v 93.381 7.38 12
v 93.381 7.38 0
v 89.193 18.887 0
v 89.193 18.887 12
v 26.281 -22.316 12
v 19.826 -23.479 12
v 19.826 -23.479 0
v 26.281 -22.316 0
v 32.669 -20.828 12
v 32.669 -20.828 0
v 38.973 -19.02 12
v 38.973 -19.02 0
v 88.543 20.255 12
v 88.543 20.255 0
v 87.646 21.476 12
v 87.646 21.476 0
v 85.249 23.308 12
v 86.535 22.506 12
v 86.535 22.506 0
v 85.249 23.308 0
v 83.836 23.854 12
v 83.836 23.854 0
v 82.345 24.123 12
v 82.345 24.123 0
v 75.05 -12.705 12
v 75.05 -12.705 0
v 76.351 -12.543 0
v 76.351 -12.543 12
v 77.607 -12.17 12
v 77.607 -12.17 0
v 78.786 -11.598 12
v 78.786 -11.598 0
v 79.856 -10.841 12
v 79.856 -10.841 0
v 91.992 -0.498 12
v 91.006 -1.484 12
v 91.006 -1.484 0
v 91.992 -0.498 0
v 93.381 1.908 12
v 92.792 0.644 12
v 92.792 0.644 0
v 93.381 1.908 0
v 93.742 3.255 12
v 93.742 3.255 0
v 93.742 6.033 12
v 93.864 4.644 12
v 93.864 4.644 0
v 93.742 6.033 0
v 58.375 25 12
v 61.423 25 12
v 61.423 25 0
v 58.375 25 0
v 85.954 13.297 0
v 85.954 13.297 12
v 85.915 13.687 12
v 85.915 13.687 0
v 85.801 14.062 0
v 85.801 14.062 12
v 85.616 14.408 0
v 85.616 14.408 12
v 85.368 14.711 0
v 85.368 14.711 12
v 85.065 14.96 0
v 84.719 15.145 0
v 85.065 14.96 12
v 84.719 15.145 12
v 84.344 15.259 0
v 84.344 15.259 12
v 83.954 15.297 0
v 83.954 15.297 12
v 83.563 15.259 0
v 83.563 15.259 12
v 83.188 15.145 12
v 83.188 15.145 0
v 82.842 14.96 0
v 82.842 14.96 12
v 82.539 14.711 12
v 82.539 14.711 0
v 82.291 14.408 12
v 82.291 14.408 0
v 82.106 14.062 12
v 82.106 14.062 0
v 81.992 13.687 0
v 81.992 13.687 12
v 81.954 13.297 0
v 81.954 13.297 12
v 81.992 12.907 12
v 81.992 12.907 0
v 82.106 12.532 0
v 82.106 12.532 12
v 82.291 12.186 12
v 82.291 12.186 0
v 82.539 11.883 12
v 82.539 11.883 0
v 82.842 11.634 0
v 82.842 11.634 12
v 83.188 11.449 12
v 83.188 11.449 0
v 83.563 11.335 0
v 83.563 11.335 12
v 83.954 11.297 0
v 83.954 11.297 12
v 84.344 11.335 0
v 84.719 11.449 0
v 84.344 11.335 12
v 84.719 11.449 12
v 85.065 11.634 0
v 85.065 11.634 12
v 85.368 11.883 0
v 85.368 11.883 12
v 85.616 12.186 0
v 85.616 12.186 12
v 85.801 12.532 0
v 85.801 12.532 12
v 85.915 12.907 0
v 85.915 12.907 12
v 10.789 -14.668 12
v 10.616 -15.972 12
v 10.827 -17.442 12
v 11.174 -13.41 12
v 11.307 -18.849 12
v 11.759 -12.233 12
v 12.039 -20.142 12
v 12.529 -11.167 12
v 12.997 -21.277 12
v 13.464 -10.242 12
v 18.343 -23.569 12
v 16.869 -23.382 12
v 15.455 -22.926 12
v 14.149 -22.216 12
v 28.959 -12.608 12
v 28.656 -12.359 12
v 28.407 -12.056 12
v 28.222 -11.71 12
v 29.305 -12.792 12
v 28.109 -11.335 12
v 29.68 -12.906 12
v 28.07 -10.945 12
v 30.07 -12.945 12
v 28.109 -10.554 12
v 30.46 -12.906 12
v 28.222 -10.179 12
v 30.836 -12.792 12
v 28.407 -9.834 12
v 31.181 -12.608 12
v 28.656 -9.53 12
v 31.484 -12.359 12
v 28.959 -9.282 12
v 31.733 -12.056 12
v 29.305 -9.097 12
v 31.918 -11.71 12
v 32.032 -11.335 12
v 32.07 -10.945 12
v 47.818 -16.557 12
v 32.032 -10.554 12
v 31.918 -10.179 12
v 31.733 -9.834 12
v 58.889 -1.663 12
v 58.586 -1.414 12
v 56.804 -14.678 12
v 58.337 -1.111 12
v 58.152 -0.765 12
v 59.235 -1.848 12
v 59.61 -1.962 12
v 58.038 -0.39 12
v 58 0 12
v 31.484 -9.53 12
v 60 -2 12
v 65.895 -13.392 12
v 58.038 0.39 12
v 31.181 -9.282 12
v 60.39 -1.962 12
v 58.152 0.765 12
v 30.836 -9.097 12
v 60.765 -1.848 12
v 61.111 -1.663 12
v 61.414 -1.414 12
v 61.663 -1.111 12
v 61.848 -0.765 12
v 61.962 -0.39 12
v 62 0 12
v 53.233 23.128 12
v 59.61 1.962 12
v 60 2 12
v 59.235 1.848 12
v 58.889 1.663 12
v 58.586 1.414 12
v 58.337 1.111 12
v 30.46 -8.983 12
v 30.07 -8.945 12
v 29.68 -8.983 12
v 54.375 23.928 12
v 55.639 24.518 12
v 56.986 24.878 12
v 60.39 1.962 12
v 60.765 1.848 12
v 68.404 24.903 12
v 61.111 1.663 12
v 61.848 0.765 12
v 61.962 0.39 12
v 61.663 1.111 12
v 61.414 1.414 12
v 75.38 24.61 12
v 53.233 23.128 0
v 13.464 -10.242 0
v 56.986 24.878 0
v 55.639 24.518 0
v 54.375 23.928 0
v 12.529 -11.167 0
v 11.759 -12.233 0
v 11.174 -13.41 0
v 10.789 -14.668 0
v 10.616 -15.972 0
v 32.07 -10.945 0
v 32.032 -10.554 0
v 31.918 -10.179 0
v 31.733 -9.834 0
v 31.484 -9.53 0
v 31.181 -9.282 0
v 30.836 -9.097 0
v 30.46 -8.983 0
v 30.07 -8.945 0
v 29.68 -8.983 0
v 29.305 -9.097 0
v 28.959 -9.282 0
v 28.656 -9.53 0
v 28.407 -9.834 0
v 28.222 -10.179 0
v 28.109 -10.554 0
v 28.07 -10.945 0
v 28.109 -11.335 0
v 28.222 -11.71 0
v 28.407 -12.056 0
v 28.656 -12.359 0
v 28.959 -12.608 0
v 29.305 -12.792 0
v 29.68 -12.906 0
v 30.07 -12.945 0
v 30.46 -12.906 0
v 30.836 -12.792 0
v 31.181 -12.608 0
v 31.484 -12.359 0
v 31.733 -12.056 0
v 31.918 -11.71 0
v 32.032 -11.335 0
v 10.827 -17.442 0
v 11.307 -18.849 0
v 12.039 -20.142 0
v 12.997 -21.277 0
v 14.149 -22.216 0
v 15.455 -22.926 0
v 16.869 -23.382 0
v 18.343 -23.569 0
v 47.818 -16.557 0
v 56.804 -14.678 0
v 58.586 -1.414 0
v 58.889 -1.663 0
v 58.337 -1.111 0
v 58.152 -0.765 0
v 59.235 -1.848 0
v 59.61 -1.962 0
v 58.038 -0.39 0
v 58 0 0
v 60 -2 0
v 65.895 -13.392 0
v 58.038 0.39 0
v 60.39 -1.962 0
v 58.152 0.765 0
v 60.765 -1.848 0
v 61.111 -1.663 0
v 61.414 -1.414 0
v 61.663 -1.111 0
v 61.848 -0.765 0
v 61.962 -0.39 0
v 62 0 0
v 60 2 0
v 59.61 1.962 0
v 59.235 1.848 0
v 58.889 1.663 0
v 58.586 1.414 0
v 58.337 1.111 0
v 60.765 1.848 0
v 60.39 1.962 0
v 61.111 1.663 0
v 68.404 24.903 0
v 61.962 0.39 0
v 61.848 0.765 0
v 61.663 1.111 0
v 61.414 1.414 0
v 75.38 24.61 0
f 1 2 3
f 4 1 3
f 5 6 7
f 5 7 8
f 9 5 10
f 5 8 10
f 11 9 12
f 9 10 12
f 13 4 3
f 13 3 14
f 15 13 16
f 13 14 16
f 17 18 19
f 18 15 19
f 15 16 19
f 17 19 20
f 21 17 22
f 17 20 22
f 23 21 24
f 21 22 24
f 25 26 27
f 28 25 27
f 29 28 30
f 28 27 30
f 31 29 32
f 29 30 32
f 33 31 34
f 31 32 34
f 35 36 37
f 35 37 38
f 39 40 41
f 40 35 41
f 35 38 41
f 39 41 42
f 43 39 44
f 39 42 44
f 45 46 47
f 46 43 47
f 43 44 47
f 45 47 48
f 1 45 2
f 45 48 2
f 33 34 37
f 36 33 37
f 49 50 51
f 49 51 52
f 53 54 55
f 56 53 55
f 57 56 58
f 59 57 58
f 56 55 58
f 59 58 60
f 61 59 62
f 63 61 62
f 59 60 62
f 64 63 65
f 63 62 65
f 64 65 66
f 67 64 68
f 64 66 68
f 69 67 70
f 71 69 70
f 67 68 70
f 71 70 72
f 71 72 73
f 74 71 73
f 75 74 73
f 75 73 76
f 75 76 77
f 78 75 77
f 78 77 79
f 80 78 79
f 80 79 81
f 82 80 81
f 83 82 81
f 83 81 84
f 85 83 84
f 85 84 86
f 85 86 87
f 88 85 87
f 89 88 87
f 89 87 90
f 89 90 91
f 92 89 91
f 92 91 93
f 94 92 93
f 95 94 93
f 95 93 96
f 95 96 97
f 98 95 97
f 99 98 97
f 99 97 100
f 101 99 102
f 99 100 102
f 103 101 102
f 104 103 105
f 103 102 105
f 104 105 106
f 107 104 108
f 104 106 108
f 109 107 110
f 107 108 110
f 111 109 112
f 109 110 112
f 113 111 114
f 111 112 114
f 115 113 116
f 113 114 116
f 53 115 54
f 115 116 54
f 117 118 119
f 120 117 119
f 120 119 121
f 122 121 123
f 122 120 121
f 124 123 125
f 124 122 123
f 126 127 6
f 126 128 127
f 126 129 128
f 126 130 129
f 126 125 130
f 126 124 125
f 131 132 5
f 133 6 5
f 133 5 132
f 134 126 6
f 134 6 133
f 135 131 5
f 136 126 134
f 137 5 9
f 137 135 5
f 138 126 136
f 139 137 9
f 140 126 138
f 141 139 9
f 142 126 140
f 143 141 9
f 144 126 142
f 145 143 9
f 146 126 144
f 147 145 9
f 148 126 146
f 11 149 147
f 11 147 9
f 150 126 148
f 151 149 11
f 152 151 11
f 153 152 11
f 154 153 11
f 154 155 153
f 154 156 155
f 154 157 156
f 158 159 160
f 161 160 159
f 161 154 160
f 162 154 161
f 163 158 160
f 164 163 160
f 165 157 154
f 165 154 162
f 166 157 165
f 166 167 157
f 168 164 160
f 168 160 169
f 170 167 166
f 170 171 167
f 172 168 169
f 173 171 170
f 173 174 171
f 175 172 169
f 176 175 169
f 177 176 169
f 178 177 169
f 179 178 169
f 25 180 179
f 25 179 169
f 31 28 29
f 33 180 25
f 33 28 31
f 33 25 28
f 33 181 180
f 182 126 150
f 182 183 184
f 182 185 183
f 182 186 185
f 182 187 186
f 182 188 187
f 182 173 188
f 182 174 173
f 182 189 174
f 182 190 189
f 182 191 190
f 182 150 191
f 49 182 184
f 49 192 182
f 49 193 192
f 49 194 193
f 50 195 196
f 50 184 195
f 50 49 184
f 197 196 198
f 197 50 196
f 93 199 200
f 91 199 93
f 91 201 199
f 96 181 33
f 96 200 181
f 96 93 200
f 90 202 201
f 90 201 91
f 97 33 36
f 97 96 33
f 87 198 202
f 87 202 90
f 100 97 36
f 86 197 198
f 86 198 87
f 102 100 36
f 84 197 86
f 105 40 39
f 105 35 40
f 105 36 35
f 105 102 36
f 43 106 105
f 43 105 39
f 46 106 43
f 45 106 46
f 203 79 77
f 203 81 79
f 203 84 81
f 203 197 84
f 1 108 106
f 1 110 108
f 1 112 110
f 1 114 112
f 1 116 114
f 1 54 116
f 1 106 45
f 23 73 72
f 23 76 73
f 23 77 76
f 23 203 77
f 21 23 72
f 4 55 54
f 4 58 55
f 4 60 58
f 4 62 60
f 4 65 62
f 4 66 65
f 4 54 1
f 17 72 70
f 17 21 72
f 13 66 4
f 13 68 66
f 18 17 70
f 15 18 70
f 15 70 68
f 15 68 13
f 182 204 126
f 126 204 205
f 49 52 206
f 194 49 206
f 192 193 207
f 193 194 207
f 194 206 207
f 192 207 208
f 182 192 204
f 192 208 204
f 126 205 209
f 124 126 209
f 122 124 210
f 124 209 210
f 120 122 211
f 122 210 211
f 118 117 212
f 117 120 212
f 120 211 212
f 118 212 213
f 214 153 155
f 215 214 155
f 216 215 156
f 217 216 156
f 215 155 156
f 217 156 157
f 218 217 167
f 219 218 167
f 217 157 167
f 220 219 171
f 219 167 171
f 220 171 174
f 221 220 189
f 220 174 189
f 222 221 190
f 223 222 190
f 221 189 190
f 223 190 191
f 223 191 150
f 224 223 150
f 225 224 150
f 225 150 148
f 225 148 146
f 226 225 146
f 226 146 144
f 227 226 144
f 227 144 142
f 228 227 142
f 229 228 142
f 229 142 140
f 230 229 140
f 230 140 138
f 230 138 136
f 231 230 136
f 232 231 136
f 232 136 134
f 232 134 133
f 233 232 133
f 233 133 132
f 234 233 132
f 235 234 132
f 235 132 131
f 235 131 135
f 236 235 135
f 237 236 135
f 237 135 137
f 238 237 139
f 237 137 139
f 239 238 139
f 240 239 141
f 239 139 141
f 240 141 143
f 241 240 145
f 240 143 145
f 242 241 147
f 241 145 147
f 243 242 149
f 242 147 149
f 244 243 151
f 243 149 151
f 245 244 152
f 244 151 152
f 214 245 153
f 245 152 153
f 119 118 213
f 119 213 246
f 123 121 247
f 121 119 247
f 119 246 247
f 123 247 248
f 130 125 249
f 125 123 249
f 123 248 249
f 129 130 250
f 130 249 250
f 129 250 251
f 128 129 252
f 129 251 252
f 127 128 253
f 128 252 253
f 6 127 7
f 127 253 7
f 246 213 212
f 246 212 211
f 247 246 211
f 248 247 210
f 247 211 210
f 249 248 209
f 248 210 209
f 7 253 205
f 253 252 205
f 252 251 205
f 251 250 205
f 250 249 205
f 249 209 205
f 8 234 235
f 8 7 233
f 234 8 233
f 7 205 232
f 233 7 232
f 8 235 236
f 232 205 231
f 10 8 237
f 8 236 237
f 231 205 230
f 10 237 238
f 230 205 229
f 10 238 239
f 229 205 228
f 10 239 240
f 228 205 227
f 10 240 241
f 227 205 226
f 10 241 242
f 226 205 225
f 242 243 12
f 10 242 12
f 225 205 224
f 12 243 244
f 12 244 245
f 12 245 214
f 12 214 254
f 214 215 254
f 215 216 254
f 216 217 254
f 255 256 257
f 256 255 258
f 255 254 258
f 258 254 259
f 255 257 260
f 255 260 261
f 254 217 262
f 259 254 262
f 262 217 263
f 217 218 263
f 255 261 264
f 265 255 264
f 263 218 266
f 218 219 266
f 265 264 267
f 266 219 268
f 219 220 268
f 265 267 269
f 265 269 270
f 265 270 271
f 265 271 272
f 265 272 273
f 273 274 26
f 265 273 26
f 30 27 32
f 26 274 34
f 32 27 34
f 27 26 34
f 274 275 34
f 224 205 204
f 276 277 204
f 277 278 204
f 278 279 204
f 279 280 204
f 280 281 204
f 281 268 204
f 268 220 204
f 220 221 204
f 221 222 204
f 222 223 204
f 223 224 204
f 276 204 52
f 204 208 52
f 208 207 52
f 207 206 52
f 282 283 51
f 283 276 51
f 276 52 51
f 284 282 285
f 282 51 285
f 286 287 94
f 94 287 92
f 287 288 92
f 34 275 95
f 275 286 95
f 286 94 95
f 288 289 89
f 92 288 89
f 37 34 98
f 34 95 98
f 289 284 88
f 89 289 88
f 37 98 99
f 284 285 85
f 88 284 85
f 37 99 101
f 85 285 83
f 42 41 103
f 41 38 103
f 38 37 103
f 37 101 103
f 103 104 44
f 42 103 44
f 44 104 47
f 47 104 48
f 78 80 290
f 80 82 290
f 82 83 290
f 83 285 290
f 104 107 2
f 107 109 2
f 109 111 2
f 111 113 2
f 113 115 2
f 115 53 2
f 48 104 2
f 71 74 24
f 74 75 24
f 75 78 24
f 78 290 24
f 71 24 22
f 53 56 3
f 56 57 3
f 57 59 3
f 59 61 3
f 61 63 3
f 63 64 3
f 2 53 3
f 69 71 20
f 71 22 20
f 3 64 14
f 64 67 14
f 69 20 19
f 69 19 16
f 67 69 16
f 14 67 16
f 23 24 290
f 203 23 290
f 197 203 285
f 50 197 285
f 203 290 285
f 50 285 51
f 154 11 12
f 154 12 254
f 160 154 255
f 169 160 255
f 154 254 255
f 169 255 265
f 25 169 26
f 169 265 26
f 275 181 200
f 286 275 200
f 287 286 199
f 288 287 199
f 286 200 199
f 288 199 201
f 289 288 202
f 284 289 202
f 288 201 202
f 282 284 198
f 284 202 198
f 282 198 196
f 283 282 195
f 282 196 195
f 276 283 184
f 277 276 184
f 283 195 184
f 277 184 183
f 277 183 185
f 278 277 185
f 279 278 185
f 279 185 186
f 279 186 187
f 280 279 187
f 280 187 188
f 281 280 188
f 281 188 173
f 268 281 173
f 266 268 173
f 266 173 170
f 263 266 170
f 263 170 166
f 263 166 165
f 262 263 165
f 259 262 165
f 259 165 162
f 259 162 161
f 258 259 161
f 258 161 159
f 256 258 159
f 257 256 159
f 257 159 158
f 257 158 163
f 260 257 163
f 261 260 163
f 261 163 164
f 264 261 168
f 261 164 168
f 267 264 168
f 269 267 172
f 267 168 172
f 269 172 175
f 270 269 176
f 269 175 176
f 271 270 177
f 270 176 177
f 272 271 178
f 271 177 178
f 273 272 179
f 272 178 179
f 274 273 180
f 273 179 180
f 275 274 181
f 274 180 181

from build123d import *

# Parameters (mm, degrees)
BOSS_EXTRUDE1_DEPTH = 12
SKETCH4_R           = 2
CUT_EXTRUDE2_DEPTH  = 100.249994256
FILLET2_R           = 8


with BuildPart() as part:
    # Sketch1 → Boss-Extrude1 (new body)
    with BuildSketch(Plane.XY):
        with BuildLine():
            Line((61.423127431, 25), (55.463282958, 25))
            Line((55.463282958, 25), (10.60599556, -12.639733311))
            Line((10.60599556, -12.639733311), (10.60599556, -24.566634818))
            ThreePointArc((10.60599556, -24.566634818), (24.944333721, -22.584404279), (38.973425347, -19.020450397))
            ThreePointArc((38.973425347, -19.020450397), (58.129824232, -14.452456897), (77.737673628, -12.617674908))
            Line((77.737673628, -12.617674908), (95.297226402, 2.116539348))
            Line((95.297226402, 2.116539348), (87.463282958, 23.640122064))
            ThreePointArc((87.463282958, 23.640122064), (74.460947109, 24.659799043), (61.423127431, 25))
        make_face()
    extrude(amount=BOSS_EXTRUDE1_DEPTH)

    # Sketch4 → Cut-Extrude2 (cut, through all)
    with BuildSketch(Plane.XY.offset(12)):
        with Locations((30.070163865, -10.944644586)):
            Circle(SKETCH4_R)
        with Locations((83.953508951, 13.296929528)):
            Circle(SKETCH4_R)
        with Locations((60, 0)):
            Circle(SKETCH4_R)
    extrude(amount=-CUT_EXTRUDE2_DEPTH, mode=Mode.SUBTRACT)

    # Fillet2
    # the kernel refuses this fillet: 8 mm, written as the material it takes off along each edge
    with BuildSketch(Plane(origin=(77.737673628, -12.617674908, -6.911835491), x_dir=(0.7660444431189745, 0.6427876096865436, 0), z_dir=(0, 0, 1))) as fillet2_piece_1:
        with BuildLine():
            CenterArc((2.764734197, 8), FILLET2_R, 232.413146156, 37.586853844)
            ThreePointArc((-2.114972699, 1.660563068), (-1.053499463, 0.835359424), (0, 0))
            Line((0, 0), (2.764734197, 0))
        make_face()
    extrude(amount=25.823670983, mode=Mode.SUBTRACT)
    with BuildSketch(Plane(origin=(10.60599556, -24.566634818, -23.209901988), x_dir=(0, 1, 0), z_dir=(0, 0, 1))) as fillet2_piece_2:
        with BuildLine():
            CenterArc((8.993765029, -8), FILLET2_R, 90, 98.772306206)
            ThreePointArc((1.087347338, -9.220065283), (0.461340951, -4.619742362), (0, 0))
            Line((0, 0), (8.993765029, 0))
        make_face()
    extrude(amount=58.419803977, mode=Mode.SUBTRACT)
    with BuildSketch(Plane(origin=(10.60599556, -12.639733311, -9.326153163), x_dir=(0.7660444431189766, 0.6427876096865411, 0), z_dir=(0, 0, 1))) as fillet2_piece_3:
        with BuildLine():
            CenterArc((FILLET2_R * 0.466307658155, -FILLET2_R), FILLET2_R, 90, 50)
            Line((-FILLET2_R * 0.299736784964, -FILLET2_R * 0.357212390313), (0, 0))
            Line((0, 0), (FILLET2_R * 0.466307658155, 0))
        make_face()
    extrude(amount=30.652306326, mode=Mode.SUBTRACT)
    with BuildSketch(Plane(origin=(95.297226402, 2.116539348, -14.004150764), x_dir=(-0.34202014332566766, 0.9396926207859088, 0), z_dir=(0, 0, 1))) as fillet2_piece_4:
        with BuildLine():
            CenterArc((FILLET2_R * 0.70020753821, FILLET2_R), FILLET2_R, 200, 70)
            Line((-FILLET2_R * 0.239485082576, FILLET2_R * 0.657979856674), (0, 0))
            Line((0, 0), (FILLET2_R * 0.70020753821, 0))
        make_face()
    extrude(amount=40.008301528, mode=Mode.SUBTRACT)
    with BuildSketch(Plane(origin=(87.463282958, 23.640122064, -12.852127182), x_dir=(-0.9955788661369174, 0.0939293420690782, 0), z_dir=(0, 0, 1))) as fillet2_piece_5:
        with BuildLine():
            CenterArc((5.058597259, 7.999577135), FILLET2_R, 205.389700078, 65.199408418)
            Line((-2.168701836, 4.569395246), (0, 0))
            ThreePointArc((0, 0), (2.570425436, -0.013214523), (5.140850873, 0))
        make_face()
    extrude(amount=37.704254365, mode=Mode.SUBTRACT)
    with BuildSketch(Plane(origin=(55.463282958, 25, -7.279404685), x_dir=(1, 0, 0), z_dir=(0, 0, 1))) as fillet2_piece_6:
        with BuildLine():
            CenterArc((FILLET2_R * 0.363970234266, -FILLET2_R), FILLET2_R, 90, 40)
            Line((-FILLET2_R * 0.27881737542, -FILLET2_R * 0.233955556881), (0, 0))
            Line((0, 0), (FILLET2_R * 0.363970234266, 0))
        make_face()
    extrude(amount=26.558809371, mode=Mode.SUBTRACT)


solid = part.part
